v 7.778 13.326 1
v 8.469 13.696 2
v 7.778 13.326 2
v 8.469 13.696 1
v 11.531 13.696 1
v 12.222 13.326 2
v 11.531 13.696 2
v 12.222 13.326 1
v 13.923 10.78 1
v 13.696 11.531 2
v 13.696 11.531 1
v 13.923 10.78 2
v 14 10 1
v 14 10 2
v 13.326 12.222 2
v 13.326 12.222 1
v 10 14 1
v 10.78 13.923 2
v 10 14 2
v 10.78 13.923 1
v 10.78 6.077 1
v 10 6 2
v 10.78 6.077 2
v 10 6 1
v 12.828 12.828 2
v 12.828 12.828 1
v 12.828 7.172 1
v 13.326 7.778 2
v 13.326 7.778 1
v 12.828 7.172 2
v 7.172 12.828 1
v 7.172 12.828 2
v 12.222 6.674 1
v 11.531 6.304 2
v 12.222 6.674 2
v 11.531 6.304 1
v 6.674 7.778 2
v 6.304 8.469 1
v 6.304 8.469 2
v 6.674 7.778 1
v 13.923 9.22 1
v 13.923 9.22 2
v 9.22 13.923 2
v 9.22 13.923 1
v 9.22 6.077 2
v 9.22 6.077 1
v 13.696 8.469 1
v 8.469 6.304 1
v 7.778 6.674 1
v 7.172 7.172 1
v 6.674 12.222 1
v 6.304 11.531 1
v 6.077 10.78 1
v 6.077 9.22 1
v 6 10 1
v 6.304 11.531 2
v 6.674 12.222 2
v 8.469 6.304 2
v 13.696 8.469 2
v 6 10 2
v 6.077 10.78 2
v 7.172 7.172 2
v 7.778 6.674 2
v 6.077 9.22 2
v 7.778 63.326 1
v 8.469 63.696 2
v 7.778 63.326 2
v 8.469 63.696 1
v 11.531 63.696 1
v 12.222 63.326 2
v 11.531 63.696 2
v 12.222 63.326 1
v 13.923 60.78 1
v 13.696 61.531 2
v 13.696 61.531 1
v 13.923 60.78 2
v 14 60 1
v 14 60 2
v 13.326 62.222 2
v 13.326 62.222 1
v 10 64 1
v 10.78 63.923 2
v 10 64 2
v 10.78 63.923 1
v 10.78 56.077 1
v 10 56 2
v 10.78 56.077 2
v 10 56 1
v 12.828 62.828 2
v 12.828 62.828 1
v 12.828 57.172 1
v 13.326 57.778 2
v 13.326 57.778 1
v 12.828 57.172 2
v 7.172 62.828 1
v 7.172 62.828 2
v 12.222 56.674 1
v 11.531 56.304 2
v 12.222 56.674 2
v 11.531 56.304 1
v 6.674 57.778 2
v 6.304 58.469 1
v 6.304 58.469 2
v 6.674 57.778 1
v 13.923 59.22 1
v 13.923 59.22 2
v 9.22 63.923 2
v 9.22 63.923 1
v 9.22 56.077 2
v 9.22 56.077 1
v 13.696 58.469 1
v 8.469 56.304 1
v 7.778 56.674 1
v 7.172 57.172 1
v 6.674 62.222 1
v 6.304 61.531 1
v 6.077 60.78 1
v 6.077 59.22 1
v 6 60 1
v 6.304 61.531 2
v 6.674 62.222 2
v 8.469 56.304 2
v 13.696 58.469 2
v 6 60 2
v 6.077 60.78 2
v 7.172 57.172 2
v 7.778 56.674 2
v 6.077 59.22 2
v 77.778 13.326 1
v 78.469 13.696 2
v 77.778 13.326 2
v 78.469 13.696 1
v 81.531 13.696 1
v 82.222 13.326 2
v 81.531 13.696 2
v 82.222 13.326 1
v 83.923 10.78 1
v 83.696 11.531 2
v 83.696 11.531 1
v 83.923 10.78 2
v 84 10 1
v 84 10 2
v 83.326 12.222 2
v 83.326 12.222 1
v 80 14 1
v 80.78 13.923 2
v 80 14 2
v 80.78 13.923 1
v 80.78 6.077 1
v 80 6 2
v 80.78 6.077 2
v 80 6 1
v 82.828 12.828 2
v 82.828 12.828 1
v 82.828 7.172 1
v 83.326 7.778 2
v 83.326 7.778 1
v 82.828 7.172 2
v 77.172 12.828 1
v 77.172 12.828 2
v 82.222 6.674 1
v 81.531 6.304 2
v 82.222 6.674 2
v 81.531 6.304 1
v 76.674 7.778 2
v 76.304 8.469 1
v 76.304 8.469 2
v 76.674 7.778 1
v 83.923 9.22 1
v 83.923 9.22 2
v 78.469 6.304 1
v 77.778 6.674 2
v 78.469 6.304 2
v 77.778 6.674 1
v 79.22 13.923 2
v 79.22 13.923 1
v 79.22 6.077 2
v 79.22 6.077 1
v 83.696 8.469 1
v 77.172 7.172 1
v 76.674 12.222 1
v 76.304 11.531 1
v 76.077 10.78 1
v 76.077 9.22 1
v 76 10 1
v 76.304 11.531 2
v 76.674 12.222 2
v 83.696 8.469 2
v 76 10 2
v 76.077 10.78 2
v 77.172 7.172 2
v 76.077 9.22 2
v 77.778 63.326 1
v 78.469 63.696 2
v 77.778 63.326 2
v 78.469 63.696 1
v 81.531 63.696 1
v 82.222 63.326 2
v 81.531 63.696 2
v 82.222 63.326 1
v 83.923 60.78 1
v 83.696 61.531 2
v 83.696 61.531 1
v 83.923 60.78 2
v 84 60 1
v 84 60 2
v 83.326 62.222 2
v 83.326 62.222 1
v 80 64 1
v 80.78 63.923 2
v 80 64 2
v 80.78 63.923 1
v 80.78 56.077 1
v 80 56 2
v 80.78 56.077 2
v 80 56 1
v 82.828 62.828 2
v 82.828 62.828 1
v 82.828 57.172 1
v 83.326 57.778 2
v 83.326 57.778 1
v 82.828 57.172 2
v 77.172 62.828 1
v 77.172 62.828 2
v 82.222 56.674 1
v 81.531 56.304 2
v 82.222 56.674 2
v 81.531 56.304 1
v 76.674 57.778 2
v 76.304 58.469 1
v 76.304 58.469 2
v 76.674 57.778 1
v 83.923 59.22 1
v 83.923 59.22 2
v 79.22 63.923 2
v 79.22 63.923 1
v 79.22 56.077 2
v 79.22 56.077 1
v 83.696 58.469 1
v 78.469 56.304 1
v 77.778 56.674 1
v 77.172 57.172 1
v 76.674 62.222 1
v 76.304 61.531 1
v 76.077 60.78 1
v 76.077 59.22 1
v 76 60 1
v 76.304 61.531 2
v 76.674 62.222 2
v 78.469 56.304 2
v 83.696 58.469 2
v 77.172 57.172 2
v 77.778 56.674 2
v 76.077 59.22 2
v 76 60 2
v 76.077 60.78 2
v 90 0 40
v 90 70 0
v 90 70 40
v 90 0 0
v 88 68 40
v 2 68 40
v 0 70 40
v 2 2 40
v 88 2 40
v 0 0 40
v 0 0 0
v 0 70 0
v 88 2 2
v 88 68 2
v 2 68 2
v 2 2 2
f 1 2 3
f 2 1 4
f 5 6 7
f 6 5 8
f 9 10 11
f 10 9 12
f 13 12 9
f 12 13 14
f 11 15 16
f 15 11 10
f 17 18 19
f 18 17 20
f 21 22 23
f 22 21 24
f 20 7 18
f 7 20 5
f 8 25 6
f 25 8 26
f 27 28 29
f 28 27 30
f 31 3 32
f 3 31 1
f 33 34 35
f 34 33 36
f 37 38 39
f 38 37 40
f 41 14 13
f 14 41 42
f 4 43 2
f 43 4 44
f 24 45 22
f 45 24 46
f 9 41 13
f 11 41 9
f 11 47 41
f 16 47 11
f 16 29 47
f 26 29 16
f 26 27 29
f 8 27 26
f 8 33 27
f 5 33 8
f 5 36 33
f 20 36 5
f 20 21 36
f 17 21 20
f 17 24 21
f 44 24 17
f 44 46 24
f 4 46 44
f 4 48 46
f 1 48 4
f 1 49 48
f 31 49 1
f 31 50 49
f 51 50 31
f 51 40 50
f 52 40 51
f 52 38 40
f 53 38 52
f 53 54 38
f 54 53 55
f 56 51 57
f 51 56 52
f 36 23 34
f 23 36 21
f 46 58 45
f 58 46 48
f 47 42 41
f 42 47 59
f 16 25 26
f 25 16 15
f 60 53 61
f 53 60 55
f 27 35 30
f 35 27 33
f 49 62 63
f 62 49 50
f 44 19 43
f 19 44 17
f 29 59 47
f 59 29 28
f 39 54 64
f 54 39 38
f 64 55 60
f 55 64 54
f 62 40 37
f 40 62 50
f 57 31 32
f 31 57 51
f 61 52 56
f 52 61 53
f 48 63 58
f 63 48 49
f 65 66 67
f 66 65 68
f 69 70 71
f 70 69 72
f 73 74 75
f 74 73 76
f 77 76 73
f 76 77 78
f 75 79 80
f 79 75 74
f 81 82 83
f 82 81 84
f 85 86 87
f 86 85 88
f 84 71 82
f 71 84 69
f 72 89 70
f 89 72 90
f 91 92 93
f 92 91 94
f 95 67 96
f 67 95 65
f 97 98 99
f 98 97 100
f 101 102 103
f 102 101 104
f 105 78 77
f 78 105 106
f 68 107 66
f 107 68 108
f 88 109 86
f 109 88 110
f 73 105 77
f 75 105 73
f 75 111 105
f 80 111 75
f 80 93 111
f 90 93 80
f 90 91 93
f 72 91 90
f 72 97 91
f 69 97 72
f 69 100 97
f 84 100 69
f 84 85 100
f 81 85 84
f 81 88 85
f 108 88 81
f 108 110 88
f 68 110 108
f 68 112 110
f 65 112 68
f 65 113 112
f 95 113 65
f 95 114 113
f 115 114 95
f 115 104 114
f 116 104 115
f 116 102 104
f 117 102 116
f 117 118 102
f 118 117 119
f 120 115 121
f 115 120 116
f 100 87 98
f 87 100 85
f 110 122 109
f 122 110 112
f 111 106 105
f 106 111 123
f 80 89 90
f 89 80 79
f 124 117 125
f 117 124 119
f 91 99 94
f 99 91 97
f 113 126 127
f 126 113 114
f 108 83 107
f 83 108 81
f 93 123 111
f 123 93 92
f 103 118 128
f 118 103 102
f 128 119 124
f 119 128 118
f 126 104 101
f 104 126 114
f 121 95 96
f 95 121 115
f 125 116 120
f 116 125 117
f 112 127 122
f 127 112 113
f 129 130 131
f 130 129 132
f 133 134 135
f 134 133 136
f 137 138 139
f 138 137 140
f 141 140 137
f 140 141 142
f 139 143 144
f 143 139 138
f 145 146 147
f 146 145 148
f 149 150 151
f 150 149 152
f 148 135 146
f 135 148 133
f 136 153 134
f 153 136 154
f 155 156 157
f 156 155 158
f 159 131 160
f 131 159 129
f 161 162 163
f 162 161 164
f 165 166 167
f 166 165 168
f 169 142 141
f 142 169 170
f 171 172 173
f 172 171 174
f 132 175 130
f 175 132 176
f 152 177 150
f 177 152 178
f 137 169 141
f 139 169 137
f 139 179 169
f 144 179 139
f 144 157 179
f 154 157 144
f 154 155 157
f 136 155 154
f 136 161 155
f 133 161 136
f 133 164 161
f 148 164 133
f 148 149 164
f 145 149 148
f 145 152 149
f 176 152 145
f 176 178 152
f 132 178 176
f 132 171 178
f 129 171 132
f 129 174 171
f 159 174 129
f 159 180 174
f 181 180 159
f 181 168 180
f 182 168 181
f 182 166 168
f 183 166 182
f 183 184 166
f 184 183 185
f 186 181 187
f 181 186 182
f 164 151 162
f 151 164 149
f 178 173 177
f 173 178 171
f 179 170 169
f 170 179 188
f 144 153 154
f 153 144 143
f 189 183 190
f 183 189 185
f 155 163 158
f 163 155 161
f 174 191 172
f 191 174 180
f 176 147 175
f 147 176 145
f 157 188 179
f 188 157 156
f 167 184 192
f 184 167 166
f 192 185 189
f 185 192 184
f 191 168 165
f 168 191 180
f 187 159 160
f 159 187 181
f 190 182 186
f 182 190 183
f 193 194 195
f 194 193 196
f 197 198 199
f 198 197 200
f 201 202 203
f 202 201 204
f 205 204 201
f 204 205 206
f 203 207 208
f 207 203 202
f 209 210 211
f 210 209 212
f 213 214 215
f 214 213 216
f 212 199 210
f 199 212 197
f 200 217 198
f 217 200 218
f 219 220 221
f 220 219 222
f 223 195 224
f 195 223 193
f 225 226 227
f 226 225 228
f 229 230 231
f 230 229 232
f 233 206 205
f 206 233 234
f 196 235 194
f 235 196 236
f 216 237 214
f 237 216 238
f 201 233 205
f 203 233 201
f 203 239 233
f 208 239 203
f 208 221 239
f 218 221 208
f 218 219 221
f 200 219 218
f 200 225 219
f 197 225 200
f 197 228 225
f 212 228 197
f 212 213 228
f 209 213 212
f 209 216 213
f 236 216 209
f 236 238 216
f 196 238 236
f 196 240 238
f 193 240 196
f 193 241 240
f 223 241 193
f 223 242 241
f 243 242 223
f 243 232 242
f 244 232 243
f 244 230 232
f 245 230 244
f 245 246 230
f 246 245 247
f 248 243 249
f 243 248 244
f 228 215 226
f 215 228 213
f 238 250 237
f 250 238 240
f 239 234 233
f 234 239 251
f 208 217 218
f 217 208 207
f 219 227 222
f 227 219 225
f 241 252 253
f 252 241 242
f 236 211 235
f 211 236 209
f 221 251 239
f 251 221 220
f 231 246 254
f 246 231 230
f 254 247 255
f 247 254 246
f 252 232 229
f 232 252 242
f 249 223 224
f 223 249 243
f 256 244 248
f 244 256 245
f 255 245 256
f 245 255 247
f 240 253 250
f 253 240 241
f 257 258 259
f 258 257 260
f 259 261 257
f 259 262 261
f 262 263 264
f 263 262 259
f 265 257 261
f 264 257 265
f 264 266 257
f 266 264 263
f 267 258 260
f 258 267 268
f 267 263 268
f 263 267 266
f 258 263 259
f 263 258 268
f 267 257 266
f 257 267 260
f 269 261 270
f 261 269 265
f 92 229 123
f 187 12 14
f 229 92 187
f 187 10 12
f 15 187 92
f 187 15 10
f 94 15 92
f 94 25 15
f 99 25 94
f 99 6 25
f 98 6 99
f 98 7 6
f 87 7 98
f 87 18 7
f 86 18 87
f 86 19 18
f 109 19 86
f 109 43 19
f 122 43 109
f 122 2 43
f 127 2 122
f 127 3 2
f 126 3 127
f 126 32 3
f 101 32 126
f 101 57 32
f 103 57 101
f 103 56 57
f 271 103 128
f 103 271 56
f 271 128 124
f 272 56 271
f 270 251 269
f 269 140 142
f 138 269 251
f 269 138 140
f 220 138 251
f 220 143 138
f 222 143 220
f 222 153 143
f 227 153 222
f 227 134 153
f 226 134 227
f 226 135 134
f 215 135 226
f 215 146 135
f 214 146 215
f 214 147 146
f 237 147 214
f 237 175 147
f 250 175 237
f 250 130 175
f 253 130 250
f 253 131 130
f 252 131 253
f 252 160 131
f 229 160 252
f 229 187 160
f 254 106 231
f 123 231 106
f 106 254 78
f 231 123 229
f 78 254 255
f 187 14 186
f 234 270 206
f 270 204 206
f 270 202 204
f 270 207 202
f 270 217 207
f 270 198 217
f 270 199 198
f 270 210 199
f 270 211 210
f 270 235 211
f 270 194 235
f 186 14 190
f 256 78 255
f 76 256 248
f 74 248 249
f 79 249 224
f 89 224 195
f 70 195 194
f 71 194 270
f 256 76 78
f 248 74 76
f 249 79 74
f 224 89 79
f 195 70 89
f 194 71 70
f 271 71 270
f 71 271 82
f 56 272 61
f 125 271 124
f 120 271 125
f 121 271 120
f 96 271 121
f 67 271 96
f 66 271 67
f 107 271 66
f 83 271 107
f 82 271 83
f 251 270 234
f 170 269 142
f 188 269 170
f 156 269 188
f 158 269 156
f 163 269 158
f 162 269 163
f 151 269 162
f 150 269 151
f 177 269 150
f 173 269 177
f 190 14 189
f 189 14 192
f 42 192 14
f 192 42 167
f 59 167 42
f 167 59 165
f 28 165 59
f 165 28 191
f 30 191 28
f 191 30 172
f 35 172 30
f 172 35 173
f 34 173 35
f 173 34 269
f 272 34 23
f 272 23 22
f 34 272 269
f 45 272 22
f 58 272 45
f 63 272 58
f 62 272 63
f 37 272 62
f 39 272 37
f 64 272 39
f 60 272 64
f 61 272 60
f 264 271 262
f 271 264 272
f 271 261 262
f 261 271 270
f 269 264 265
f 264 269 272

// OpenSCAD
$fn = 32;

// ----------------------------------------------------------------------
// Enclosure box: bosses enclosure
// ----------------------------------------------------------------------

// --- parameters (mm) ---
box_l = 90;               // outer length, X
box_w = 70;               // outer width, Y
box_h = 40;               // outer height
wall_t = 2;               // wall thickness
boss_r = 4;               // corner boss radius
hole_r = 1.5;             // boss screw hole radius
boss_in = 10;             // boss inset from the corners

inner_h = box_h - wall_t;  // cavity depth
boss_h = inner_h - 2;  // corner boss height

difference() {
  cube([box_l, box_w, box_h]);
  translate([wall_t, wall_t, wall_t])
    cube([box_l - 2 * wall_t, box_w - 2 * wall_t, box_h]);
  for (sx = [0, 1], sy = [0, 1])
    translate([sx ? box_l - boss_in : boss_in,
               sy ? box_w - boss_in : boss_in, wall_t - 1]) {
      cylinder(r = boss_r, h = boss_h);
      translate([0, 0, boss_h - 4])
        cylinder(r = hole_r, h = 5);
    }
}
